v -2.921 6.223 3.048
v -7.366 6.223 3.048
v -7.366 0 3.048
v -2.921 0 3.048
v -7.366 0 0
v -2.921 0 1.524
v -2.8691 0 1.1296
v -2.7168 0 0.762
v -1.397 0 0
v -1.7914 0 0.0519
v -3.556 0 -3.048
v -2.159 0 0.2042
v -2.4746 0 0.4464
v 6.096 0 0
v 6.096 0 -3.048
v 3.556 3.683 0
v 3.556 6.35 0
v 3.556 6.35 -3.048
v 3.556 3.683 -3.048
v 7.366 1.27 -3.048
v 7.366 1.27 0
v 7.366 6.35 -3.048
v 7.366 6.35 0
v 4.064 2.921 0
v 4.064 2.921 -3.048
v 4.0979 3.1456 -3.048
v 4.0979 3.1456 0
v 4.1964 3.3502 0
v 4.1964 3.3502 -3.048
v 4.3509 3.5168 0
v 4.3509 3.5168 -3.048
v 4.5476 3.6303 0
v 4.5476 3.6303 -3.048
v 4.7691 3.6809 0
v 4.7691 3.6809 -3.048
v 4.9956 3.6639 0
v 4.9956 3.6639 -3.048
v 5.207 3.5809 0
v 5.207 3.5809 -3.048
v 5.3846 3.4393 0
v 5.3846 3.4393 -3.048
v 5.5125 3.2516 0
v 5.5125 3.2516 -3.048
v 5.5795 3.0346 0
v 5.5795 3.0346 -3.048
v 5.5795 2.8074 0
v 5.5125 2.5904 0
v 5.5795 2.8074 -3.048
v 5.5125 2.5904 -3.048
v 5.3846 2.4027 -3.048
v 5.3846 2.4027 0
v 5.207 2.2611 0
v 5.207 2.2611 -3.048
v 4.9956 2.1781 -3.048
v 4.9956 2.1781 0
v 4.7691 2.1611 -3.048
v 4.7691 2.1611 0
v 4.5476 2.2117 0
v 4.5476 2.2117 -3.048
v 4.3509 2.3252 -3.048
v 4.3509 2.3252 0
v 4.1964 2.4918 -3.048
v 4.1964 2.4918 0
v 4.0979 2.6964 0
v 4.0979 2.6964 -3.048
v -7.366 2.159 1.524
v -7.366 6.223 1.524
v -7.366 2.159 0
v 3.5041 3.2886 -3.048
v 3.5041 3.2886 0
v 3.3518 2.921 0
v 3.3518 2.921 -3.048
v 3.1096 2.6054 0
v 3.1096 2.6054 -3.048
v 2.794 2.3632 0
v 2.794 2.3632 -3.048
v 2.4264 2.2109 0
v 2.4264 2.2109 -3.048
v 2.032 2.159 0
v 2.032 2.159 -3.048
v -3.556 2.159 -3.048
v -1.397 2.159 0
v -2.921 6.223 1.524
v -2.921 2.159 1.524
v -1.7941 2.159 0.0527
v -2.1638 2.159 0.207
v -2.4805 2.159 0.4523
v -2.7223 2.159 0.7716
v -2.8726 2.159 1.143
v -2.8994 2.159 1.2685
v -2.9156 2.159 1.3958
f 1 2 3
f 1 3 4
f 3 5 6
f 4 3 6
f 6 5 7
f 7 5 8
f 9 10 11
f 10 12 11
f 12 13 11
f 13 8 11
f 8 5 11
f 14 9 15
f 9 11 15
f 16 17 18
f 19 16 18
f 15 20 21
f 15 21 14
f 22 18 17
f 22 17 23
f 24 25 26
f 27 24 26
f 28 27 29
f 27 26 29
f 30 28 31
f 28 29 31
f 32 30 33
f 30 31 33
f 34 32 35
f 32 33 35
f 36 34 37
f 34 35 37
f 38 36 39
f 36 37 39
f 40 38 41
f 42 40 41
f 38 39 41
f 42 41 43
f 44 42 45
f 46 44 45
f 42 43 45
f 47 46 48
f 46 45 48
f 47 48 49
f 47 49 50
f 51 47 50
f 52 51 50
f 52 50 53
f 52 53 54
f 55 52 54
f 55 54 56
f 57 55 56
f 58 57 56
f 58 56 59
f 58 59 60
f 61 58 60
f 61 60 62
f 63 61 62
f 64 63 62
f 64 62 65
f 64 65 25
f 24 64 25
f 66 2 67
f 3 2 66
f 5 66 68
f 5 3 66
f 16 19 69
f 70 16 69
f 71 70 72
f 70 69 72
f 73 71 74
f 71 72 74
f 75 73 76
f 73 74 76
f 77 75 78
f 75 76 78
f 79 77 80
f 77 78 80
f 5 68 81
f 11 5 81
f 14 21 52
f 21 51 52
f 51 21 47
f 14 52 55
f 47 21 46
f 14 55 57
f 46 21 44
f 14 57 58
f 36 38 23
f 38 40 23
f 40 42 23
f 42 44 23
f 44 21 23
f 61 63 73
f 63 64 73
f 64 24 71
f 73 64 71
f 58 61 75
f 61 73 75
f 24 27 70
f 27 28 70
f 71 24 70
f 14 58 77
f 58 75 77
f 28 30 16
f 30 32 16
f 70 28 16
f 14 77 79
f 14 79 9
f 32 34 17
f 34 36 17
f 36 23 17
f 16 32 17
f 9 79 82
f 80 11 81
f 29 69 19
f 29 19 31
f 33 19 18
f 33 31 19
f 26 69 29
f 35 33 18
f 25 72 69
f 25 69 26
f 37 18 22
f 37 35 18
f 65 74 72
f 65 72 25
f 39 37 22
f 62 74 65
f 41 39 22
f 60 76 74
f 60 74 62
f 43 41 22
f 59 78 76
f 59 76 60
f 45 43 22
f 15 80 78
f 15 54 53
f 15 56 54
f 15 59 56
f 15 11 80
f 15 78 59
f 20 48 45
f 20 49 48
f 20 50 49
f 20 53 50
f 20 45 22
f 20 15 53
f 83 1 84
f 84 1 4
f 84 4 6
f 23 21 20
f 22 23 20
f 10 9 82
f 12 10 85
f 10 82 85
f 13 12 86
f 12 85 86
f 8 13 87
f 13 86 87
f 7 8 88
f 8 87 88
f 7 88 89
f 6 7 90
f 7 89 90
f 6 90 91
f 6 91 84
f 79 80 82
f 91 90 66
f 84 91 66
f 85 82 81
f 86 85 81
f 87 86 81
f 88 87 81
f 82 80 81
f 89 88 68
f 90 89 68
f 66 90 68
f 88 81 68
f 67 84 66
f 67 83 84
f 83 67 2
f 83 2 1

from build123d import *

# Parameters (mm, degrees)
SKETCH1_W           = 14.732
SKETCH1_H           = 6.096
BOSS_EXTRUDE1_DEPTH = 6.35
CUT_EXTRUDE2_DEPTH  = 7.35
SKETCH3_W           = 10.922
SKETCH3_H           = 6.096
CUT_EXTRUDE1_DEPTH  = 2.667
CUT_EXTRUDE3_DEPTH  = 4.683
SKETCH9_W           = 4.445
SKETCH9_H           = 1.524
BOSS_EXTRUDE2_DEPTH = 2.54
CUT_EXTRUDE4_DEPTH  = 7.096
CUT_EXTRUDE5_DEPTH  = 4.191
SKETCH15_W          = 0.048393345
SKETCH15_H          = 1.524
CUT_EXTRUDE10_DEPTH = 2.905
SKETCH13_W          = 4.445
SKETCH13_H          = 1.524
CUT_EXTRUDE11_DEPTH = 4.572
SKETCH16_R          = 0.762
CUT_EXTRUDE12_DEPTH = 4.572


with BuildPart() as part:
    # Sketch1 → Boss-Extrude1 (new body)
    with BuildSketch(Plane(origin=(0, 0, 0), x_dir=(1, 0, 0), z_dir=(0, 1, 0))):
        Rectangle(SKETCH1_W, SKETCH1_H)
    extrude(amount=BOSS_EXTRUDE1_DEPTH)

    # Sketch4 → Cut-Extrude2 (cut, through all)
    with BuildSketch(Plane(origin=(0, 6.35, 0), x_dir=(1, 0, 0), z_dir=(0, 1, 0))):
        with BuildLine():
            Line((7.366, 0), (-1.397, 0))
            ThreePointArc((-1.397, 0), (-0.319369265, -0.446369265), (0.127, -1.524))
            ThreePointArc((0.127, -1.524), (-0.319369265, -2.601630735), (-1.397, -3.048))
            Line((-1.397, -3.048), (7.366, -3.048))
            Line((7.366, -3.048), (7.366, 0))
        make_face()
        with BuildLine():
            ThreePointArc((0.127, -1.524), (-0.319369265, -0.446369265), (-1.397, 0))
            Line((-1.397, 0), (-1.397, -3.048))
            ThreePointArc((-1.397, -3.048), (-0.319369265, -2.601630735), (0.127, -1.524))
        make_face()
        with BuildLine():
            Line((-1.397, -3.048), (-1.397, 0))
            ThreePointArc((-1.397, 0), (-2.474630735, -0.446369265), (-2.921, -1.524))
            ThreePointArc((-2.921, -1.524), (-2.474630735, -2.601630735), (-1.397, -3.048))
        make_face()
        with BuildLine():
            ThreePointArc((-1.397, -3.048), (-2.474630735, -2.601630735), (-2.921, -1.524))
            Line((-2.921, -1.524), (-2.921, -3.048))
            Line((-2.921, -3.048), (-1.397, -3.048))
        make_face()
    extrude(amount=-CUT_EXTRUDE2_DEPTH, mode=Mode.SUBTRACT)

    # Sketch3 → Cut-Extrude1 (cut)
    with BuildSketch(Plane(origin=(0, 6.35, 0), x_dir=(1, 0, 0), z_dir=(0, 1, 0))):
        with Locations((-1.905, 0)):
            Rectangle(SKETCH3_W, SKETCH3_H)
    extrude(amount=-CUT_EXTRUDE1_DEPTH, mode=Mode.SUBTRACT)

    # Sketch8 → Cut-Extrude3 (cut, through all)
    with BuildSketch(Plane(origin=(0, 3.683, 0), x_dir=(1, 0, 0), z_dir=(0, 1, 0))):
        Polygon((-7.366, 0), (-3.556, 3.048), (-7.366, 3.048), align=None)
    extrude(amount=-CUT_EXTRUDE3_DEPTH, mode=Mode.SUBTRACT)

    # Sketch9 → Boss-Extrude2 (add)
    with BuildSketch(Plane(origin=(0, 3.683, 0), x_dir=(1, 0, 0), z_dir=(0, 1, 0))):
        with Locations((-5.1435, -2.286)):
            Rectangle(SKETCH9_W, SKETCH9_H)
    extrude(amount=BOSS_EXTRUDE2_DEPTH)

    # Sketch10 → Cut-Extrude4 (cut, through all)
    with BuildSketch(Plane(origin=(0, 0, -3.048), x_dir=(-1, 0, 0), z_dir=(0, 0, -1))):
        Polygon((-7.366, 1.27), (-6.096, 0), (-7.366, 0), align=None)
    extrude(amount=-CUT_EXTRUDE4_DEPTH, mode=Mode.SUBTRACT)

    # Sketch12 → Cut-Extrude5 (cut)
    with BuildSketch(Plane(origin=(0, 0, -3.048), x_dir=(-1, 0, 0), z_dir=(0, 0, -1))):
        with BuildLine():
            ThreePointArc((-3.556, 3.683), (-3.109630735, 2.605369265), (-2.032, 2.159))
            Line((-2.032, 2.159), (2.921, 2.159))
            Line((2.921, 2.159), (2.921, 3.683))
            Line((2.921, 3.683), (-3.556, 3.683))
        make_face()
    extrude(amount=-CUT_EXTRUDE5_DEPTH, mode=Mode.SUBTRACT)

    # Sketch15 → Cut-Extrude10 (cut, through all)
    with BuildSketch(Plane(origin=(0, 0, 1.143), x_dir=(-1, 0, 0), z_dir=(0, 0, -1))):
        with Locations((2.896803328, 2.921)):
            Rectangle(SKETCH15_W, SKETCH15_H)
    extrude(amount=-CUT_EXTRUDE10_DEPTH, mode=Mode.SUBTRACT)

    # Sketch13 → Cut-Extrude11 (cut)
    with BuildSketch(Plane(origin=(0, 0, -3.048), x_dir=(-1, 0, 0), z_dir=(0, 0, -1))):
        with Locations((5.1435, 2.921)):
            Rectangle(SKETCH13_W, SKETCH13_H)
    extrude(amount=-CUT_EXTRUDE11_DEPTH, mode=Mode.SUBTRACT)

    # Sketch16 → Cut-Extrude12 (cut)
    with BuildSketch(Plane(origin=(0, 0, -3.048), x_dir=(-1, 0, 0), z_dir=(0, 0, -1))):
        with Locations((-4.826, 2.921)):
            Circle(SKETCH16_R)
    extrude(amount=-CUT_EXTRUDE12_DEPTH, mode=Mode.SUBTRACT)


solid = part.part
